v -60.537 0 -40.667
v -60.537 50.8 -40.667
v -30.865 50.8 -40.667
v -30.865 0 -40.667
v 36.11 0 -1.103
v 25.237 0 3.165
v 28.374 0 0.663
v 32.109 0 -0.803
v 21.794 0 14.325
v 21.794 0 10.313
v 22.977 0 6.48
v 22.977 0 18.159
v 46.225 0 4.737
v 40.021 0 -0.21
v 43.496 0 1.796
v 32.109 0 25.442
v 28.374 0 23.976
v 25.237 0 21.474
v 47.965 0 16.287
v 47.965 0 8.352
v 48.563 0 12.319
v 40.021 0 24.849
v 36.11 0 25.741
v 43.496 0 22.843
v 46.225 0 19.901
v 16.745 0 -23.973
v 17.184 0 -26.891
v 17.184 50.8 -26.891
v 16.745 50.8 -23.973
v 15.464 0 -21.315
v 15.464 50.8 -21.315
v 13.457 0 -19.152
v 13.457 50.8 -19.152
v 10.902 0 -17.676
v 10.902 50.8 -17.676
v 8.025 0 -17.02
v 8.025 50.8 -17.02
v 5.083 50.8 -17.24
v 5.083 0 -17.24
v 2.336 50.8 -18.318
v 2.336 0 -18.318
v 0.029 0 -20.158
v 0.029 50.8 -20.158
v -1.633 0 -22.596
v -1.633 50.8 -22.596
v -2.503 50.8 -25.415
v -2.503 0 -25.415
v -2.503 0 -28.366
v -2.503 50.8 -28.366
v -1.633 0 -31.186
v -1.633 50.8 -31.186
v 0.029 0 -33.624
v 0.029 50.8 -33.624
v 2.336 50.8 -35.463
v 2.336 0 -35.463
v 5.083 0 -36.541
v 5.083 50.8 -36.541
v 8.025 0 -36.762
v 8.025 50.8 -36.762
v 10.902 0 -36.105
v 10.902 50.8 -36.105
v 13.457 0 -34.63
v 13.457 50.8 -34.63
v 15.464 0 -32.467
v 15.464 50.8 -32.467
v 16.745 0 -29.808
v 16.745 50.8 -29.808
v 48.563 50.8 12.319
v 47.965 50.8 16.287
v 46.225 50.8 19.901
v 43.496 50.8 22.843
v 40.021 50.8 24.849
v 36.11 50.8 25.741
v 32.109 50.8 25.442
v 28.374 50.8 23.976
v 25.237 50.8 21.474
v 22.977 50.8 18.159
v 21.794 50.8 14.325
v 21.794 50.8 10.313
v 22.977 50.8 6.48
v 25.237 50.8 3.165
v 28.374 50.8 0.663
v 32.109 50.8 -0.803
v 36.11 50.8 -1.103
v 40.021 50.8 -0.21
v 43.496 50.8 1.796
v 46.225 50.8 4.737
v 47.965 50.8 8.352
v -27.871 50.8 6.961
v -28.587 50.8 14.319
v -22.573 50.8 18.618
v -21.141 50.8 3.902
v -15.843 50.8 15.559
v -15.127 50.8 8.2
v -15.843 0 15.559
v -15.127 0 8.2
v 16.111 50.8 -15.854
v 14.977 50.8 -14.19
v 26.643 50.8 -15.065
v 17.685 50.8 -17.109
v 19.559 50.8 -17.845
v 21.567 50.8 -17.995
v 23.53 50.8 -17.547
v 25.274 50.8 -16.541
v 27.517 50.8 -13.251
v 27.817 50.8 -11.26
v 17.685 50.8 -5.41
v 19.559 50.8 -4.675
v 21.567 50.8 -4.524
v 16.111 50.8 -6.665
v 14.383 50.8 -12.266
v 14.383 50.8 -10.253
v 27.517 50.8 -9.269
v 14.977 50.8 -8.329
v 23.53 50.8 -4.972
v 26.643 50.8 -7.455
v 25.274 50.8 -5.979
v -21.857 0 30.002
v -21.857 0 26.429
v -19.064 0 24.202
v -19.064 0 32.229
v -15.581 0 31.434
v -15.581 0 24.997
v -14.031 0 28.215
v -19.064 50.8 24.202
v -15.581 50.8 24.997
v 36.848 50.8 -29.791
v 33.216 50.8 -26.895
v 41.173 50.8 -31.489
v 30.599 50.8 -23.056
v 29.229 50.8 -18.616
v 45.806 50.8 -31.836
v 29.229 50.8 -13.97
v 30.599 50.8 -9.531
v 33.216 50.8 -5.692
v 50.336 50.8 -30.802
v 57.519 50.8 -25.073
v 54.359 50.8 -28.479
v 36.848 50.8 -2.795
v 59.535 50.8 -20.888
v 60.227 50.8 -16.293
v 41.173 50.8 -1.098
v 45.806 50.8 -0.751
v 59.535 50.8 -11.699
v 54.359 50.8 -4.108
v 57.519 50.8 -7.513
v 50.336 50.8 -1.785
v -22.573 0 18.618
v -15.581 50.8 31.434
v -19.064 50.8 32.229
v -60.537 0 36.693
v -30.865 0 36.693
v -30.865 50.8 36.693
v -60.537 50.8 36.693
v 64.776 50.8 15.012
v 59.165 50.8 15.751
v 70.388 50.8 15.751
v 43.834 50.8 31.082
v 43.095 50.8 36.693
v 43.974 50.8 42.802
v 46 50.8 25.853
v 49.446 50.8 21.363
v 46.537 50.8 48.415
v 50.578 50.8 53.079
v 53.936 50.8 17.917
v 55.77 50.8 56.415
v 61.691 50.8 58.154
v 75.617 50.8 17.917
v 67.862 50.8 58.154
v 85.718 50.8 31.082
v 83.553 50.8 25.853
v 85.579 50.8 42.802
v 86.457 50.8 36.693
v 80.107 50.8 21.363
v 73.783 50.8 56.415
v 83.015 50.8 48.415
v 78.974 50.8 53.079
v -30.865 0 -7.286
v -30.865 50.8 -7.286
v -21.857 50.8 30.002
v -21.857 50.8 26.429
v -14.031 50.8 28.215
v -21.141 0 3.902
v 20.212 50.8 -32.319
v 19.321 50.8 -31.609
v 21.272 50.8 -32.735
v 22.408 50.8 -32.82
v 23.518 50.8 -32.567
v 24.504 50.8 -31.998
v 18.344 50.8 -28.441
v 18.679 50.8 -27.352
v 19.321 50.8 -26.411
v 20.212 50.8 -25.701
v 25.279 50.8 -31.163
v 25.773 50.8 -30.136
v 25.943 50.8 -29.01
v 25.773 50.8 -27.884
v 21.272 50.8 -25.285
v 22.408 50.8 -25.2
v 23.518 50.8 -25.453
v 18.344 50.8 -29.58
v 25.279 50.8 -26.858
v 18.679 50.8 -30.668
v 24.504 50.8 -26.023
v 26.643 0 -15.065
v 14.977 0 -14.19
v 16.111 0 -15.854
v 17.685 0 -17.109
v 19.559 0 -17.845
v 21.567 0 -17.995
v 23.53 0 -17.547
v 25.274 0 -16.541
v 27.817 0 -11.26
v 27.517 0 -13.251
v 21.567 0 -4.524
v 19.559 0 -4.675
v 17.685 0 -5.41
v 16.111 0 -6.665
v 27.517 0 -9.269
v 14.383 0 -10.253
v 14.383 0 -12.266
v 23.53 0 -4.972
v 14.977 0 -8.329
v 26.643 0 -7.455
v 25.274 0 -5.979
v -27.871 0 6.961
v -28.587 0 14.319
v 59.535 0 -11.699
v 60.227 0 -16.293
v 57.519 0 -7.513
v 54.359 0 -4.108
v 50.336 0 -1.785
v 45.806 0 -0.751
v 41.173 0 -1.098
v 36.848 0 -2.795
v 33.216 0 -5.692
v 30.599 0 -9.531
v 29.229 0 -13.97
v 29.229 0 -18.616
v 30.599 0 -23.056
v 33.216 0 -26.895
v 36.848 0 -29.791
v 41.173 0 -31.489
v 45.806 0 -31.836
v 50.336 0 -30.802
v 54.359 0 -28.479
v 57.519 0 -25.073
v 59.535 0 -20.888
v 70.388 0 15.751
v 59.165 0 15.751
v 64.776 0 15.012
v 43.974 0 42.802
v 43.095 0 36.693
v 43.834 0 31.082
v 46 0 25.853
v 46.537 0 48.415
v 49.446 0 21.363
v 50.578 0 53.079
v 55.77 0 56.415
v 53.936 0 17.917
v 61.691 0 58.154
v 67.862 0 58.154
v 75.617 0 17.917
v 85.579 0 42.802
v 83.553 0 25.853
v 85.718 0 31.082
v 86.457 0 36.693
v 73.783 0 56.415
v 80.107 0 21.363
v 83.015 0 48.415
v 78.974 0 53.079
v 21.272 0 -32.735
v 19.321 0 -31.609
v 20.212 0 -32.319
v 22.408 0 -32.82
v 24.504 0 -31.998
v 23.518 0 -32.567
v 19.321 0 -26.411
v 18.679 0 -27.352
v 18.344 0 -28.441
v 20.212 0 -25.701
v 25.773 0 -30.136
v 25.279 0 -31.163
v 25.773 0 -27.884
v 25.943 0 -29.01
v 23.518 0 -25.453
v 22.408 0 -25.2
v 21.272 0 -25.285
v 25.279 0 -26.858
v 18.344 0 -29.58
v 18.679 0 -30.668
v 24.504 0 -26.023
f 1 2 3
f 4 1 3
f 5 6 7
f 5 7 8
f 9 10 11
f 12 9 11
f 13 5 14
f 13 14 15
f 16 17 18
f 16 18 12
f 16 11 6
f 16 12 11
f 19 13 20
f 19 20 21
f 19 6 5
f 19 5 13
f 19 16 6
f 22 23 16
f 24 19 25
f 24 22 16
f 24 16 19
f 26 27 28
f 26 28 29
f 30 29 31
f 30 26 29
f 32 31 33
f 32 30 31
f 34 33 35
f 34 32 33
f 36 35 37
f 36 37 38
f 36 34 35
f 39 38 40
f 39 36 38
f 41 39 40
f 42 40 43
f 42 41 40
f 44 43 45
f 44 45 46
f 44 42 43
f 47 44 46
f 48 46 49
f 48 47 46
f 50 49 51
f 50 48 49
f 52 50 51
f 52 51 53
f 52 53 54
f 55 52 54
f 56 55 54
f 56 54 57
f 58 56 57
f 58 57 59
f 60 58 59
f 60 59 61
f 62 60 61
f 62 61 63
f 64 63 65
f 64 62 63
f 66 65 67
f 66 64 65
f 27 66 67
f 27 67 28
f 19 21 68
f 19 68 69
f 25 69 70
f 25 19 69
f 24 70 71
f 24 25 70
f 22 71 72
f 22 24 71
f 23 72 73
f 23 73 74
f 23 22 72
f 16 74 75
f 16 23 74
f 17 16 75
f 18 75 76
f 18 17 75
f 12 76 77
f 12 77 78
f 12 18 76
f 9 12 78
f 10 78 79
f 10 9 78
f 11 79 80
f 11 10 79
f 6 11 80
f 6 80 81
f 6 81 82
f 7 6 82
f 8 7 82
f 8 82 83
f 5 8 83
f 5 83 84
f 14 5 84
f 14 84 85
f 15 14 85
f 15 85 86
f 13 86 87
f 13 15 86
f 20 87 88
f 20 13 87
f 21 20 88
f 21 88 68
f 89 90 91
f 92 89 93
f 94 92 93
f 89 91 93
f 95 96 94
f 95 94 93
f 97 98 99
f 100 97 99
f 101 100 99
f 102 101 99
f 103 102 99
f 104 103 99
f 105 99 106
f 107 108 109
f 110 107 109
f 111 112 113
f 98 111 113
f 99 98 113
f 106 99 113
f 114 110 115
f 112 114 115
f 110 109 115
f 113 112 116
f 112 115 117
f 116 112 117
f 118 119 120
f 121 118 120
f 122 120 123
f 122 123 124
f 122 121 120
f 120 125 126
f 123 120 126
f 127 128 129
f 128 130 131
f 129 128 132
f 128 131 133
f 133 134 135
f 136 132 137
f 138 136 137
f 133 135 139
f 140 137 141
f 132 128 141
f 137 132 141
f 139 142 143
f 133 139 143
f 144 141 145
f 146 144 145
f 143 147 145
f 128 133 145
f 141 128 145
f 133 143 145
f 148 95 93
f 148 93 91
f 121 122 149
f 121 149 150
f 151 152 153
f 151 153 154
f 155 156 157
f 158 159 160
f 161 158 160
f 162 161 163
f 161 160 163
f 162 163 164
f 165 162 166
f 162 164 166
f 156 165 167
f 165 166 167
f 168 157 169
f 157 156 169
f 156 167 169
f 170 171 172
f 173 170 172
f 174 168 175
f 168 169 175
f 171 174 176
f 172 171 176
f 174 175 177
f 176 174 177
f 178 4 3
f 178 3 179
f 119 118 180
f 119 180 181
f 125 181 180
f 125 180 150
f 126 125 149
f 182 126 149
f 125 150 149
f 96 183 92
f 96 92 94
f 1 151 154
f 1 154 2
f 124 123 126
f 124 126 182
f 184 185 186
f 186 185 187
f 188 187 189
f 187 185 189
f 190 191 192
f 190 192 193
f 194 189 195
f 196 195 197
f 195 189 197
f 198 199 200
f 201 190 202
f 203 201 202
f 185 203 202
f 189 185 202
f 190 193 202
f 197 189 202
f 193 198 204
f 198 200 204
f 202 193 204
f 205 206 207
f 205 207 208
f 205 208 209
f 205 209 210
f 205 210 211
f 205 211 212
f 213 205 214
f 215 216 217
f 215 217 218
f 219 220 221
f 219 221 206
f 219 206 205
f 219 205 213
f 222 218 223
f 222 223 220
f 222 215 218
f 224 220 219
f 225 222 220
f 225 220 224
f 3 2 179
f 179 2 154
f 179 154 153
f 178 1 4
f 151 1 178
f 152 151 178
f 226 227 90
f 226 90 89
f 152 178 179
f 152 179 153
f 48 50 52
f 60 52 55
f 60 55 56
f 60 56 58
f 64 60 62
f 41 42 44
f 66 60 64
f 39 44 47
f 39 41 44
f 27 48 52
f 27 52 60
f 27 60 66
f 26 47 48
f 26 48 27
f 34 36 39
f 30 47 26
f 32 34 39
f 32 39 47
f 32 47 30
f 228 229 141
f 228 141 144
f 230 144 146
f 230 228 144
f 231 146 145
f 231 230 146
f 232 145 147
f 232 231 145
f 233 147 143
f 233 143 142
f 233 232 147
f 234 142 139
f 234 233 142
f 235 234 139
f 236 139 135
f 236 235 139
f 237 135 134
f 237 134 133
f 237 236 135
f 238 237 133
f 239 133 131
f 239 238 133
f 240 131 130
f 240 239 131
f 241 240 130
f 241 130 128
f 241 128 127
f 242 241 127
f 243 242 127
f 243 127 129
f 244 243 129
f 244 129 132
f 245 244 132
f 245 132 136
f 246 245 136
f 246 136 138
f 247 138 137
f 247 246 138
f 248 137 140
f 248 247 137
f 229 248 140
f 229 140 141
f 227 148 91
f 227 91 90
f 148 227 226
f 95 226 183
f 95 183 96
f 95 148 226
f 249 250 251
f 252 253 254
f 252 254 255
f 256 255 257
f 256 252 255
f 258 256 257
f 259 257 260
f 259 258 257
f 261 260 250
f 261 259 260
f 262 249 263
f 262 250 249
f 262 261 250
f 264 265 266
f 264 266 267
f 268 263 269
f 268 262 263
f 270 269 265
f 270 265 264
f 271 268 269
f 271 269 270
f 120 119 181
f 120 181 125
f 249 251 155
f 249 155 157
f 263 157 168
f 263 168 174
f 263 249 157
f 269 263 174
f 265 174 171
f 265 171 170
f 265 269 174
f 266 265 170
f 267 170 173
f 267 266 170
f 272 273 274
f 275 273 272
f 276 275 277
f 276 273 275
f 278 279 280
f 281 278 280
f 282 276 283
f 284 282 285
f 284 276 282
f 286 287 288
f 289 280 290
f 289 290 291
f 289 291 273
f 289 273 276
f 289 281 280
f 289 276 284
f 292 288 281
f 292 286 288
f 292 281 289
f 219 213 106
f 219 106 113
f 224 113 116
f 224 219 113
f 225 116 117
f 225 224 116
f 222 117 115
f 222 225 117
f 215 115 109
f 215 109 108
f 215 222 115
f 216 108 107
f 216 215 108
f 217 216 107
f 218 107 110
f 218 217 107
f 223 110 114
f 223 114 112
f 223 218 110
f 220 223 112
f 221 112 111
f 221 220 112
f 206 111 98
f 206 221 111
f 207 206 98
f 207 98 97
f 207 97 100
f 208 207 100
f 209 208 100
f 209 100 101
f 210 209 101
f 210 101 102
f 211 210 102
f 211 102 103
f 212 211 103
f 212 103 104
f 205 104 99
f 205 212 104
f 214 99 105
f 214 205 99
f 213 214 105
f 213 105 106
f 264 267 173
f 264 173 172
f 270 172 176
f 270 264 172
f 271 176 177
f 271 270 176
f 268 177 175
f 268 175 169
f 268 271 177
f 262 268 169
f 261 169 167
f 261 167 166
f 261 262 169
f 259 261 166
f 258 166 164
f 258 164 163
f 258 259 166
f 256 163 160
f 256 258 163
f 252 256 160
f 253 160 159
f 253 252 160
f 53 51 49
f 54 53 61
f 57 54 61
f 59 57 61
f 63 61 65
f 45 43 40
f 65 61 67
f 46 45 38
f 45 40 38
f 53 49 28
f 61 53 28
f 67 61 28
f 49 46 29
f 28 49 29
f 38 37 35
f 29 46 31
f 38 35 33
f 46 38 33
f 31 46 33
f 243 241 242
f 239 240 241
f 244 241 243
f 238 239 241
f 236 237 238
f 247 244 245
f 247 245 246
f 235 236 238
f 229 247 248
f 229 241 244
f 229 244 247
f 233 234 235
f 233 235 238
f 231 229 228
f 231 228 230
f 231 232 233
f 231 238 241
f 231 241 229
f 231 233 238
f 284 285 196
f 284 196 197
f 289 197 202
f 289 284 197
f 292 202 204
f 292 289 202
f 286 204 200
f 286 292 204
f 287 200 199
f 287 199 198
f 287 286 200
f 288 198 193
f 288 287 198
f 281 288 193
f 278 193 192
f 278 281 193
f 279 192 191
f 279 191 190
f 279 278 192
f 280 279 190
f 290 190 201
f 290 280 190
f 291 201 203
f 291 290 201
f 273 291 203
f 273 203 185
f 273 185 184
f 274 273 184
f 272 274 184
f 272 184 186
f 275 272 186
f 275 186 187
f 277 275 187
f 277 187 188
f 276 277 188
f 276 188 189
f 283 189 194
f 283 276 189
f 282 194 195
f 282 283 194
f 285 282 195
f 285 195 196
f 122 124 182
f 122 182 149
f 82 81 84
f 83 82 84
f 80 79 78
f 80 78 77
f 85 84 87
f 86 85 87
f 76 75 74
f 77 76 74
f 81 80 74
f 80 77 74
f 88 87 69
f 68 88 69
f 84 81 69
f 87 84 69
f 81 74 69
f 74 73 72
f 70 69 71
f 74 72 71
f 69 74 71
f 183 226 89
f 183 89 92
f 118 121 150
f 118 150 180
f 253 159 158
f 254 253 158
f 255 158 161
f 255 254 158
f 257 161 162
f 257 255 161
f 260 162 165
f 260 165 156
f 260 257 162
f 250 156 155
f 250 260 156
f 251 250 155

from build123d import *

# Parameters (mm, degrees)
F0_W     = 3.7090729456
F0_H     = 33.3816539496
F1_DEPTH = 50.8
F0_R     = 9.898740662
F0_R_2   = 13.4595762484
F0_R_3   = 15.5861238633
F0_R_4   = 6.7545111413
F0_R_5   = 3.82092803


with BuildPart() as f1:
    # F0 (on Front) → F1 (new body)
    with BuildSketch(Plane.XZ):
        Polygon((-30.864784494, 36.6933308542), (-60.5373680592, 36.6933308542), (-60.5373680592, 8.87528155), (-45.7010762766, 8.87528155), (-30.864784494, 8.87528155), align=None)
        with Locations((-32.7193209669, -23.976505734)):
            Rectangle(F0_W, F0_H)
        Polygon((-30.864784494, -7.2856787592), (-30.864784494, 0), (-38.2829303853, 0), (-38.2829303853, -7.2856787592), (-34.5738574397, -7.2856787592), align=None)
        Polygon((-45.7010762766, 8.87528155), (-60.5373680592, 8.87528155), (-60.5373680592, -40.6673327088), (-34.5738574397, -40.6673327088), (-34.5738574397, -7.2856787592), (-38.2829303853, -7.2856787592), (-38.2829303853, 0), (-45.7010762766, 0), align=None)
        Polygon((-30.864784494, 0), (-30.864784494, 8.87528155), (-45.7010762766, 8.87528155), (-45.7010762766, 0), (-38.2829303853, 0), align=None)
    extrude(amount=-F1_DEPTH)


with BuildPart() as f1b:
    # F0 (on Front) → F1, piece 2 (new body)
    with BuildSketch(Plane.XZ):
        with Locations((7.2856796905, -26.8907789141)):
            Circle(F0_R)
    extrude(amount=-F1_DEPTH)


with BuildPart() as f1c:
    # F0 (on Front) → F1, piece 3 (new body)
    with BuildSketch(Plane.XZ):
        Polygon((-27.8714858528, 6.9607391719), (-21.1412645344, 3.9015460993), (-15.1268149592, 8.2004921979), (-15.8425867025, 15.558631369), (-22.5728080209, 18.6178244416), (-28.5872575961, 14.3188783431), align=None)
    extrude(amount=-F1_DEPTH)


with BuildPart() as f1d:
    # F0 (on Front) → F1, piece 4 (new body)
    with BuildSketch(Plane.XZ):
        Polygon((-21.8570362777, 30.0016424943), (-21.8570362777, 26.4292523872), (-19.0640292243, 24.2019035872), (-15.5812063957, 24.9968351702), (-14.0312044184, 28.2154474407), (-15.5812063957, 31.4340597112), (-19.0640292243, 32.2289912943), align=None)
    extrude(amount=-F1_DEPTH)


with BuildPart() as f1e:
    # F0 (on Front) → F1, piece 5 (new body)
    with BuildSketch(Plane.XZ):
        with Locations((35.1037234068, 12.3194204643)):
            Circle(F0_R_2)
    extrude(amount=-F1_DEPTH)


with BuildPart() as f1f:
    # F0 (on Front) → F1, piece 6 (new body)
    with BuildSketch(Plane.XZ):
        with BuildLine():
            Line((64.7763088346, 36.6933308542), (43.0953982079, 36.6933308542))
            ThreePointArc((43.0953982079, 36.6933308542), (49.4455899082, 21.3626119278), (64.7763088346, 15.0124202276))
            Line((64.7763088346, 15.0124202276), (64.7763088346, 36.6933308542))
        make_face()
        with BuildLine():
            ThreePointArc((86.4572194612, 36.6933308542), (64.7763088346, 58.3742414808), (43.0953982079, 36.6933308542))
            Line((43.0953982079, 36.6933308542), (64.7763088346, 36.6933308542))
            Line((64.7763088346, 36.6933308542), (64.7763088346, 15.0124202276))
            ThreePointArc((64.7763088346, 15.0124202276), (80.1070277609, 21.3626119278), (86.4572194612, 36.6933308542))
        make_face()
    extrude(amount=-F1_DEPTH)


with BuildPart() as f1g:
    # F0 (on Front) → F1, piece 7 (new body)
    with BuildSketch(Plane.XZ):
        with Locations((44.6413420141, -16.2934269756)):
            Circle(F0_R_3)
    extrude(amount=-F1_DEPTH)


with BuildPart() as f1h:
    # F0 (on Front) → F1, piece 8 (new body)
    with BuildSketch(Plane.XZ):
        with Locations((21.0622344166, -11.2596852705)):
            Circle(F0_R_4)
    extrude(amount=-F1_DEPTH)


with BuildPart() as f1i:
    # F0 (on Front) → F1, piece 9 (new body)
    with BuildSketch(Plane.XZ):
        with Locations((22.1219714731, -29.0102474391)):
            Circle(F0_R_5)
    extrude(amount=-F1_DEPTH)


solid = Compound([f1.part, f1b.part, f1c.part, f1d.part, f1e.part, f1f.part, f1g.part, f1h.part, f1i.part])
